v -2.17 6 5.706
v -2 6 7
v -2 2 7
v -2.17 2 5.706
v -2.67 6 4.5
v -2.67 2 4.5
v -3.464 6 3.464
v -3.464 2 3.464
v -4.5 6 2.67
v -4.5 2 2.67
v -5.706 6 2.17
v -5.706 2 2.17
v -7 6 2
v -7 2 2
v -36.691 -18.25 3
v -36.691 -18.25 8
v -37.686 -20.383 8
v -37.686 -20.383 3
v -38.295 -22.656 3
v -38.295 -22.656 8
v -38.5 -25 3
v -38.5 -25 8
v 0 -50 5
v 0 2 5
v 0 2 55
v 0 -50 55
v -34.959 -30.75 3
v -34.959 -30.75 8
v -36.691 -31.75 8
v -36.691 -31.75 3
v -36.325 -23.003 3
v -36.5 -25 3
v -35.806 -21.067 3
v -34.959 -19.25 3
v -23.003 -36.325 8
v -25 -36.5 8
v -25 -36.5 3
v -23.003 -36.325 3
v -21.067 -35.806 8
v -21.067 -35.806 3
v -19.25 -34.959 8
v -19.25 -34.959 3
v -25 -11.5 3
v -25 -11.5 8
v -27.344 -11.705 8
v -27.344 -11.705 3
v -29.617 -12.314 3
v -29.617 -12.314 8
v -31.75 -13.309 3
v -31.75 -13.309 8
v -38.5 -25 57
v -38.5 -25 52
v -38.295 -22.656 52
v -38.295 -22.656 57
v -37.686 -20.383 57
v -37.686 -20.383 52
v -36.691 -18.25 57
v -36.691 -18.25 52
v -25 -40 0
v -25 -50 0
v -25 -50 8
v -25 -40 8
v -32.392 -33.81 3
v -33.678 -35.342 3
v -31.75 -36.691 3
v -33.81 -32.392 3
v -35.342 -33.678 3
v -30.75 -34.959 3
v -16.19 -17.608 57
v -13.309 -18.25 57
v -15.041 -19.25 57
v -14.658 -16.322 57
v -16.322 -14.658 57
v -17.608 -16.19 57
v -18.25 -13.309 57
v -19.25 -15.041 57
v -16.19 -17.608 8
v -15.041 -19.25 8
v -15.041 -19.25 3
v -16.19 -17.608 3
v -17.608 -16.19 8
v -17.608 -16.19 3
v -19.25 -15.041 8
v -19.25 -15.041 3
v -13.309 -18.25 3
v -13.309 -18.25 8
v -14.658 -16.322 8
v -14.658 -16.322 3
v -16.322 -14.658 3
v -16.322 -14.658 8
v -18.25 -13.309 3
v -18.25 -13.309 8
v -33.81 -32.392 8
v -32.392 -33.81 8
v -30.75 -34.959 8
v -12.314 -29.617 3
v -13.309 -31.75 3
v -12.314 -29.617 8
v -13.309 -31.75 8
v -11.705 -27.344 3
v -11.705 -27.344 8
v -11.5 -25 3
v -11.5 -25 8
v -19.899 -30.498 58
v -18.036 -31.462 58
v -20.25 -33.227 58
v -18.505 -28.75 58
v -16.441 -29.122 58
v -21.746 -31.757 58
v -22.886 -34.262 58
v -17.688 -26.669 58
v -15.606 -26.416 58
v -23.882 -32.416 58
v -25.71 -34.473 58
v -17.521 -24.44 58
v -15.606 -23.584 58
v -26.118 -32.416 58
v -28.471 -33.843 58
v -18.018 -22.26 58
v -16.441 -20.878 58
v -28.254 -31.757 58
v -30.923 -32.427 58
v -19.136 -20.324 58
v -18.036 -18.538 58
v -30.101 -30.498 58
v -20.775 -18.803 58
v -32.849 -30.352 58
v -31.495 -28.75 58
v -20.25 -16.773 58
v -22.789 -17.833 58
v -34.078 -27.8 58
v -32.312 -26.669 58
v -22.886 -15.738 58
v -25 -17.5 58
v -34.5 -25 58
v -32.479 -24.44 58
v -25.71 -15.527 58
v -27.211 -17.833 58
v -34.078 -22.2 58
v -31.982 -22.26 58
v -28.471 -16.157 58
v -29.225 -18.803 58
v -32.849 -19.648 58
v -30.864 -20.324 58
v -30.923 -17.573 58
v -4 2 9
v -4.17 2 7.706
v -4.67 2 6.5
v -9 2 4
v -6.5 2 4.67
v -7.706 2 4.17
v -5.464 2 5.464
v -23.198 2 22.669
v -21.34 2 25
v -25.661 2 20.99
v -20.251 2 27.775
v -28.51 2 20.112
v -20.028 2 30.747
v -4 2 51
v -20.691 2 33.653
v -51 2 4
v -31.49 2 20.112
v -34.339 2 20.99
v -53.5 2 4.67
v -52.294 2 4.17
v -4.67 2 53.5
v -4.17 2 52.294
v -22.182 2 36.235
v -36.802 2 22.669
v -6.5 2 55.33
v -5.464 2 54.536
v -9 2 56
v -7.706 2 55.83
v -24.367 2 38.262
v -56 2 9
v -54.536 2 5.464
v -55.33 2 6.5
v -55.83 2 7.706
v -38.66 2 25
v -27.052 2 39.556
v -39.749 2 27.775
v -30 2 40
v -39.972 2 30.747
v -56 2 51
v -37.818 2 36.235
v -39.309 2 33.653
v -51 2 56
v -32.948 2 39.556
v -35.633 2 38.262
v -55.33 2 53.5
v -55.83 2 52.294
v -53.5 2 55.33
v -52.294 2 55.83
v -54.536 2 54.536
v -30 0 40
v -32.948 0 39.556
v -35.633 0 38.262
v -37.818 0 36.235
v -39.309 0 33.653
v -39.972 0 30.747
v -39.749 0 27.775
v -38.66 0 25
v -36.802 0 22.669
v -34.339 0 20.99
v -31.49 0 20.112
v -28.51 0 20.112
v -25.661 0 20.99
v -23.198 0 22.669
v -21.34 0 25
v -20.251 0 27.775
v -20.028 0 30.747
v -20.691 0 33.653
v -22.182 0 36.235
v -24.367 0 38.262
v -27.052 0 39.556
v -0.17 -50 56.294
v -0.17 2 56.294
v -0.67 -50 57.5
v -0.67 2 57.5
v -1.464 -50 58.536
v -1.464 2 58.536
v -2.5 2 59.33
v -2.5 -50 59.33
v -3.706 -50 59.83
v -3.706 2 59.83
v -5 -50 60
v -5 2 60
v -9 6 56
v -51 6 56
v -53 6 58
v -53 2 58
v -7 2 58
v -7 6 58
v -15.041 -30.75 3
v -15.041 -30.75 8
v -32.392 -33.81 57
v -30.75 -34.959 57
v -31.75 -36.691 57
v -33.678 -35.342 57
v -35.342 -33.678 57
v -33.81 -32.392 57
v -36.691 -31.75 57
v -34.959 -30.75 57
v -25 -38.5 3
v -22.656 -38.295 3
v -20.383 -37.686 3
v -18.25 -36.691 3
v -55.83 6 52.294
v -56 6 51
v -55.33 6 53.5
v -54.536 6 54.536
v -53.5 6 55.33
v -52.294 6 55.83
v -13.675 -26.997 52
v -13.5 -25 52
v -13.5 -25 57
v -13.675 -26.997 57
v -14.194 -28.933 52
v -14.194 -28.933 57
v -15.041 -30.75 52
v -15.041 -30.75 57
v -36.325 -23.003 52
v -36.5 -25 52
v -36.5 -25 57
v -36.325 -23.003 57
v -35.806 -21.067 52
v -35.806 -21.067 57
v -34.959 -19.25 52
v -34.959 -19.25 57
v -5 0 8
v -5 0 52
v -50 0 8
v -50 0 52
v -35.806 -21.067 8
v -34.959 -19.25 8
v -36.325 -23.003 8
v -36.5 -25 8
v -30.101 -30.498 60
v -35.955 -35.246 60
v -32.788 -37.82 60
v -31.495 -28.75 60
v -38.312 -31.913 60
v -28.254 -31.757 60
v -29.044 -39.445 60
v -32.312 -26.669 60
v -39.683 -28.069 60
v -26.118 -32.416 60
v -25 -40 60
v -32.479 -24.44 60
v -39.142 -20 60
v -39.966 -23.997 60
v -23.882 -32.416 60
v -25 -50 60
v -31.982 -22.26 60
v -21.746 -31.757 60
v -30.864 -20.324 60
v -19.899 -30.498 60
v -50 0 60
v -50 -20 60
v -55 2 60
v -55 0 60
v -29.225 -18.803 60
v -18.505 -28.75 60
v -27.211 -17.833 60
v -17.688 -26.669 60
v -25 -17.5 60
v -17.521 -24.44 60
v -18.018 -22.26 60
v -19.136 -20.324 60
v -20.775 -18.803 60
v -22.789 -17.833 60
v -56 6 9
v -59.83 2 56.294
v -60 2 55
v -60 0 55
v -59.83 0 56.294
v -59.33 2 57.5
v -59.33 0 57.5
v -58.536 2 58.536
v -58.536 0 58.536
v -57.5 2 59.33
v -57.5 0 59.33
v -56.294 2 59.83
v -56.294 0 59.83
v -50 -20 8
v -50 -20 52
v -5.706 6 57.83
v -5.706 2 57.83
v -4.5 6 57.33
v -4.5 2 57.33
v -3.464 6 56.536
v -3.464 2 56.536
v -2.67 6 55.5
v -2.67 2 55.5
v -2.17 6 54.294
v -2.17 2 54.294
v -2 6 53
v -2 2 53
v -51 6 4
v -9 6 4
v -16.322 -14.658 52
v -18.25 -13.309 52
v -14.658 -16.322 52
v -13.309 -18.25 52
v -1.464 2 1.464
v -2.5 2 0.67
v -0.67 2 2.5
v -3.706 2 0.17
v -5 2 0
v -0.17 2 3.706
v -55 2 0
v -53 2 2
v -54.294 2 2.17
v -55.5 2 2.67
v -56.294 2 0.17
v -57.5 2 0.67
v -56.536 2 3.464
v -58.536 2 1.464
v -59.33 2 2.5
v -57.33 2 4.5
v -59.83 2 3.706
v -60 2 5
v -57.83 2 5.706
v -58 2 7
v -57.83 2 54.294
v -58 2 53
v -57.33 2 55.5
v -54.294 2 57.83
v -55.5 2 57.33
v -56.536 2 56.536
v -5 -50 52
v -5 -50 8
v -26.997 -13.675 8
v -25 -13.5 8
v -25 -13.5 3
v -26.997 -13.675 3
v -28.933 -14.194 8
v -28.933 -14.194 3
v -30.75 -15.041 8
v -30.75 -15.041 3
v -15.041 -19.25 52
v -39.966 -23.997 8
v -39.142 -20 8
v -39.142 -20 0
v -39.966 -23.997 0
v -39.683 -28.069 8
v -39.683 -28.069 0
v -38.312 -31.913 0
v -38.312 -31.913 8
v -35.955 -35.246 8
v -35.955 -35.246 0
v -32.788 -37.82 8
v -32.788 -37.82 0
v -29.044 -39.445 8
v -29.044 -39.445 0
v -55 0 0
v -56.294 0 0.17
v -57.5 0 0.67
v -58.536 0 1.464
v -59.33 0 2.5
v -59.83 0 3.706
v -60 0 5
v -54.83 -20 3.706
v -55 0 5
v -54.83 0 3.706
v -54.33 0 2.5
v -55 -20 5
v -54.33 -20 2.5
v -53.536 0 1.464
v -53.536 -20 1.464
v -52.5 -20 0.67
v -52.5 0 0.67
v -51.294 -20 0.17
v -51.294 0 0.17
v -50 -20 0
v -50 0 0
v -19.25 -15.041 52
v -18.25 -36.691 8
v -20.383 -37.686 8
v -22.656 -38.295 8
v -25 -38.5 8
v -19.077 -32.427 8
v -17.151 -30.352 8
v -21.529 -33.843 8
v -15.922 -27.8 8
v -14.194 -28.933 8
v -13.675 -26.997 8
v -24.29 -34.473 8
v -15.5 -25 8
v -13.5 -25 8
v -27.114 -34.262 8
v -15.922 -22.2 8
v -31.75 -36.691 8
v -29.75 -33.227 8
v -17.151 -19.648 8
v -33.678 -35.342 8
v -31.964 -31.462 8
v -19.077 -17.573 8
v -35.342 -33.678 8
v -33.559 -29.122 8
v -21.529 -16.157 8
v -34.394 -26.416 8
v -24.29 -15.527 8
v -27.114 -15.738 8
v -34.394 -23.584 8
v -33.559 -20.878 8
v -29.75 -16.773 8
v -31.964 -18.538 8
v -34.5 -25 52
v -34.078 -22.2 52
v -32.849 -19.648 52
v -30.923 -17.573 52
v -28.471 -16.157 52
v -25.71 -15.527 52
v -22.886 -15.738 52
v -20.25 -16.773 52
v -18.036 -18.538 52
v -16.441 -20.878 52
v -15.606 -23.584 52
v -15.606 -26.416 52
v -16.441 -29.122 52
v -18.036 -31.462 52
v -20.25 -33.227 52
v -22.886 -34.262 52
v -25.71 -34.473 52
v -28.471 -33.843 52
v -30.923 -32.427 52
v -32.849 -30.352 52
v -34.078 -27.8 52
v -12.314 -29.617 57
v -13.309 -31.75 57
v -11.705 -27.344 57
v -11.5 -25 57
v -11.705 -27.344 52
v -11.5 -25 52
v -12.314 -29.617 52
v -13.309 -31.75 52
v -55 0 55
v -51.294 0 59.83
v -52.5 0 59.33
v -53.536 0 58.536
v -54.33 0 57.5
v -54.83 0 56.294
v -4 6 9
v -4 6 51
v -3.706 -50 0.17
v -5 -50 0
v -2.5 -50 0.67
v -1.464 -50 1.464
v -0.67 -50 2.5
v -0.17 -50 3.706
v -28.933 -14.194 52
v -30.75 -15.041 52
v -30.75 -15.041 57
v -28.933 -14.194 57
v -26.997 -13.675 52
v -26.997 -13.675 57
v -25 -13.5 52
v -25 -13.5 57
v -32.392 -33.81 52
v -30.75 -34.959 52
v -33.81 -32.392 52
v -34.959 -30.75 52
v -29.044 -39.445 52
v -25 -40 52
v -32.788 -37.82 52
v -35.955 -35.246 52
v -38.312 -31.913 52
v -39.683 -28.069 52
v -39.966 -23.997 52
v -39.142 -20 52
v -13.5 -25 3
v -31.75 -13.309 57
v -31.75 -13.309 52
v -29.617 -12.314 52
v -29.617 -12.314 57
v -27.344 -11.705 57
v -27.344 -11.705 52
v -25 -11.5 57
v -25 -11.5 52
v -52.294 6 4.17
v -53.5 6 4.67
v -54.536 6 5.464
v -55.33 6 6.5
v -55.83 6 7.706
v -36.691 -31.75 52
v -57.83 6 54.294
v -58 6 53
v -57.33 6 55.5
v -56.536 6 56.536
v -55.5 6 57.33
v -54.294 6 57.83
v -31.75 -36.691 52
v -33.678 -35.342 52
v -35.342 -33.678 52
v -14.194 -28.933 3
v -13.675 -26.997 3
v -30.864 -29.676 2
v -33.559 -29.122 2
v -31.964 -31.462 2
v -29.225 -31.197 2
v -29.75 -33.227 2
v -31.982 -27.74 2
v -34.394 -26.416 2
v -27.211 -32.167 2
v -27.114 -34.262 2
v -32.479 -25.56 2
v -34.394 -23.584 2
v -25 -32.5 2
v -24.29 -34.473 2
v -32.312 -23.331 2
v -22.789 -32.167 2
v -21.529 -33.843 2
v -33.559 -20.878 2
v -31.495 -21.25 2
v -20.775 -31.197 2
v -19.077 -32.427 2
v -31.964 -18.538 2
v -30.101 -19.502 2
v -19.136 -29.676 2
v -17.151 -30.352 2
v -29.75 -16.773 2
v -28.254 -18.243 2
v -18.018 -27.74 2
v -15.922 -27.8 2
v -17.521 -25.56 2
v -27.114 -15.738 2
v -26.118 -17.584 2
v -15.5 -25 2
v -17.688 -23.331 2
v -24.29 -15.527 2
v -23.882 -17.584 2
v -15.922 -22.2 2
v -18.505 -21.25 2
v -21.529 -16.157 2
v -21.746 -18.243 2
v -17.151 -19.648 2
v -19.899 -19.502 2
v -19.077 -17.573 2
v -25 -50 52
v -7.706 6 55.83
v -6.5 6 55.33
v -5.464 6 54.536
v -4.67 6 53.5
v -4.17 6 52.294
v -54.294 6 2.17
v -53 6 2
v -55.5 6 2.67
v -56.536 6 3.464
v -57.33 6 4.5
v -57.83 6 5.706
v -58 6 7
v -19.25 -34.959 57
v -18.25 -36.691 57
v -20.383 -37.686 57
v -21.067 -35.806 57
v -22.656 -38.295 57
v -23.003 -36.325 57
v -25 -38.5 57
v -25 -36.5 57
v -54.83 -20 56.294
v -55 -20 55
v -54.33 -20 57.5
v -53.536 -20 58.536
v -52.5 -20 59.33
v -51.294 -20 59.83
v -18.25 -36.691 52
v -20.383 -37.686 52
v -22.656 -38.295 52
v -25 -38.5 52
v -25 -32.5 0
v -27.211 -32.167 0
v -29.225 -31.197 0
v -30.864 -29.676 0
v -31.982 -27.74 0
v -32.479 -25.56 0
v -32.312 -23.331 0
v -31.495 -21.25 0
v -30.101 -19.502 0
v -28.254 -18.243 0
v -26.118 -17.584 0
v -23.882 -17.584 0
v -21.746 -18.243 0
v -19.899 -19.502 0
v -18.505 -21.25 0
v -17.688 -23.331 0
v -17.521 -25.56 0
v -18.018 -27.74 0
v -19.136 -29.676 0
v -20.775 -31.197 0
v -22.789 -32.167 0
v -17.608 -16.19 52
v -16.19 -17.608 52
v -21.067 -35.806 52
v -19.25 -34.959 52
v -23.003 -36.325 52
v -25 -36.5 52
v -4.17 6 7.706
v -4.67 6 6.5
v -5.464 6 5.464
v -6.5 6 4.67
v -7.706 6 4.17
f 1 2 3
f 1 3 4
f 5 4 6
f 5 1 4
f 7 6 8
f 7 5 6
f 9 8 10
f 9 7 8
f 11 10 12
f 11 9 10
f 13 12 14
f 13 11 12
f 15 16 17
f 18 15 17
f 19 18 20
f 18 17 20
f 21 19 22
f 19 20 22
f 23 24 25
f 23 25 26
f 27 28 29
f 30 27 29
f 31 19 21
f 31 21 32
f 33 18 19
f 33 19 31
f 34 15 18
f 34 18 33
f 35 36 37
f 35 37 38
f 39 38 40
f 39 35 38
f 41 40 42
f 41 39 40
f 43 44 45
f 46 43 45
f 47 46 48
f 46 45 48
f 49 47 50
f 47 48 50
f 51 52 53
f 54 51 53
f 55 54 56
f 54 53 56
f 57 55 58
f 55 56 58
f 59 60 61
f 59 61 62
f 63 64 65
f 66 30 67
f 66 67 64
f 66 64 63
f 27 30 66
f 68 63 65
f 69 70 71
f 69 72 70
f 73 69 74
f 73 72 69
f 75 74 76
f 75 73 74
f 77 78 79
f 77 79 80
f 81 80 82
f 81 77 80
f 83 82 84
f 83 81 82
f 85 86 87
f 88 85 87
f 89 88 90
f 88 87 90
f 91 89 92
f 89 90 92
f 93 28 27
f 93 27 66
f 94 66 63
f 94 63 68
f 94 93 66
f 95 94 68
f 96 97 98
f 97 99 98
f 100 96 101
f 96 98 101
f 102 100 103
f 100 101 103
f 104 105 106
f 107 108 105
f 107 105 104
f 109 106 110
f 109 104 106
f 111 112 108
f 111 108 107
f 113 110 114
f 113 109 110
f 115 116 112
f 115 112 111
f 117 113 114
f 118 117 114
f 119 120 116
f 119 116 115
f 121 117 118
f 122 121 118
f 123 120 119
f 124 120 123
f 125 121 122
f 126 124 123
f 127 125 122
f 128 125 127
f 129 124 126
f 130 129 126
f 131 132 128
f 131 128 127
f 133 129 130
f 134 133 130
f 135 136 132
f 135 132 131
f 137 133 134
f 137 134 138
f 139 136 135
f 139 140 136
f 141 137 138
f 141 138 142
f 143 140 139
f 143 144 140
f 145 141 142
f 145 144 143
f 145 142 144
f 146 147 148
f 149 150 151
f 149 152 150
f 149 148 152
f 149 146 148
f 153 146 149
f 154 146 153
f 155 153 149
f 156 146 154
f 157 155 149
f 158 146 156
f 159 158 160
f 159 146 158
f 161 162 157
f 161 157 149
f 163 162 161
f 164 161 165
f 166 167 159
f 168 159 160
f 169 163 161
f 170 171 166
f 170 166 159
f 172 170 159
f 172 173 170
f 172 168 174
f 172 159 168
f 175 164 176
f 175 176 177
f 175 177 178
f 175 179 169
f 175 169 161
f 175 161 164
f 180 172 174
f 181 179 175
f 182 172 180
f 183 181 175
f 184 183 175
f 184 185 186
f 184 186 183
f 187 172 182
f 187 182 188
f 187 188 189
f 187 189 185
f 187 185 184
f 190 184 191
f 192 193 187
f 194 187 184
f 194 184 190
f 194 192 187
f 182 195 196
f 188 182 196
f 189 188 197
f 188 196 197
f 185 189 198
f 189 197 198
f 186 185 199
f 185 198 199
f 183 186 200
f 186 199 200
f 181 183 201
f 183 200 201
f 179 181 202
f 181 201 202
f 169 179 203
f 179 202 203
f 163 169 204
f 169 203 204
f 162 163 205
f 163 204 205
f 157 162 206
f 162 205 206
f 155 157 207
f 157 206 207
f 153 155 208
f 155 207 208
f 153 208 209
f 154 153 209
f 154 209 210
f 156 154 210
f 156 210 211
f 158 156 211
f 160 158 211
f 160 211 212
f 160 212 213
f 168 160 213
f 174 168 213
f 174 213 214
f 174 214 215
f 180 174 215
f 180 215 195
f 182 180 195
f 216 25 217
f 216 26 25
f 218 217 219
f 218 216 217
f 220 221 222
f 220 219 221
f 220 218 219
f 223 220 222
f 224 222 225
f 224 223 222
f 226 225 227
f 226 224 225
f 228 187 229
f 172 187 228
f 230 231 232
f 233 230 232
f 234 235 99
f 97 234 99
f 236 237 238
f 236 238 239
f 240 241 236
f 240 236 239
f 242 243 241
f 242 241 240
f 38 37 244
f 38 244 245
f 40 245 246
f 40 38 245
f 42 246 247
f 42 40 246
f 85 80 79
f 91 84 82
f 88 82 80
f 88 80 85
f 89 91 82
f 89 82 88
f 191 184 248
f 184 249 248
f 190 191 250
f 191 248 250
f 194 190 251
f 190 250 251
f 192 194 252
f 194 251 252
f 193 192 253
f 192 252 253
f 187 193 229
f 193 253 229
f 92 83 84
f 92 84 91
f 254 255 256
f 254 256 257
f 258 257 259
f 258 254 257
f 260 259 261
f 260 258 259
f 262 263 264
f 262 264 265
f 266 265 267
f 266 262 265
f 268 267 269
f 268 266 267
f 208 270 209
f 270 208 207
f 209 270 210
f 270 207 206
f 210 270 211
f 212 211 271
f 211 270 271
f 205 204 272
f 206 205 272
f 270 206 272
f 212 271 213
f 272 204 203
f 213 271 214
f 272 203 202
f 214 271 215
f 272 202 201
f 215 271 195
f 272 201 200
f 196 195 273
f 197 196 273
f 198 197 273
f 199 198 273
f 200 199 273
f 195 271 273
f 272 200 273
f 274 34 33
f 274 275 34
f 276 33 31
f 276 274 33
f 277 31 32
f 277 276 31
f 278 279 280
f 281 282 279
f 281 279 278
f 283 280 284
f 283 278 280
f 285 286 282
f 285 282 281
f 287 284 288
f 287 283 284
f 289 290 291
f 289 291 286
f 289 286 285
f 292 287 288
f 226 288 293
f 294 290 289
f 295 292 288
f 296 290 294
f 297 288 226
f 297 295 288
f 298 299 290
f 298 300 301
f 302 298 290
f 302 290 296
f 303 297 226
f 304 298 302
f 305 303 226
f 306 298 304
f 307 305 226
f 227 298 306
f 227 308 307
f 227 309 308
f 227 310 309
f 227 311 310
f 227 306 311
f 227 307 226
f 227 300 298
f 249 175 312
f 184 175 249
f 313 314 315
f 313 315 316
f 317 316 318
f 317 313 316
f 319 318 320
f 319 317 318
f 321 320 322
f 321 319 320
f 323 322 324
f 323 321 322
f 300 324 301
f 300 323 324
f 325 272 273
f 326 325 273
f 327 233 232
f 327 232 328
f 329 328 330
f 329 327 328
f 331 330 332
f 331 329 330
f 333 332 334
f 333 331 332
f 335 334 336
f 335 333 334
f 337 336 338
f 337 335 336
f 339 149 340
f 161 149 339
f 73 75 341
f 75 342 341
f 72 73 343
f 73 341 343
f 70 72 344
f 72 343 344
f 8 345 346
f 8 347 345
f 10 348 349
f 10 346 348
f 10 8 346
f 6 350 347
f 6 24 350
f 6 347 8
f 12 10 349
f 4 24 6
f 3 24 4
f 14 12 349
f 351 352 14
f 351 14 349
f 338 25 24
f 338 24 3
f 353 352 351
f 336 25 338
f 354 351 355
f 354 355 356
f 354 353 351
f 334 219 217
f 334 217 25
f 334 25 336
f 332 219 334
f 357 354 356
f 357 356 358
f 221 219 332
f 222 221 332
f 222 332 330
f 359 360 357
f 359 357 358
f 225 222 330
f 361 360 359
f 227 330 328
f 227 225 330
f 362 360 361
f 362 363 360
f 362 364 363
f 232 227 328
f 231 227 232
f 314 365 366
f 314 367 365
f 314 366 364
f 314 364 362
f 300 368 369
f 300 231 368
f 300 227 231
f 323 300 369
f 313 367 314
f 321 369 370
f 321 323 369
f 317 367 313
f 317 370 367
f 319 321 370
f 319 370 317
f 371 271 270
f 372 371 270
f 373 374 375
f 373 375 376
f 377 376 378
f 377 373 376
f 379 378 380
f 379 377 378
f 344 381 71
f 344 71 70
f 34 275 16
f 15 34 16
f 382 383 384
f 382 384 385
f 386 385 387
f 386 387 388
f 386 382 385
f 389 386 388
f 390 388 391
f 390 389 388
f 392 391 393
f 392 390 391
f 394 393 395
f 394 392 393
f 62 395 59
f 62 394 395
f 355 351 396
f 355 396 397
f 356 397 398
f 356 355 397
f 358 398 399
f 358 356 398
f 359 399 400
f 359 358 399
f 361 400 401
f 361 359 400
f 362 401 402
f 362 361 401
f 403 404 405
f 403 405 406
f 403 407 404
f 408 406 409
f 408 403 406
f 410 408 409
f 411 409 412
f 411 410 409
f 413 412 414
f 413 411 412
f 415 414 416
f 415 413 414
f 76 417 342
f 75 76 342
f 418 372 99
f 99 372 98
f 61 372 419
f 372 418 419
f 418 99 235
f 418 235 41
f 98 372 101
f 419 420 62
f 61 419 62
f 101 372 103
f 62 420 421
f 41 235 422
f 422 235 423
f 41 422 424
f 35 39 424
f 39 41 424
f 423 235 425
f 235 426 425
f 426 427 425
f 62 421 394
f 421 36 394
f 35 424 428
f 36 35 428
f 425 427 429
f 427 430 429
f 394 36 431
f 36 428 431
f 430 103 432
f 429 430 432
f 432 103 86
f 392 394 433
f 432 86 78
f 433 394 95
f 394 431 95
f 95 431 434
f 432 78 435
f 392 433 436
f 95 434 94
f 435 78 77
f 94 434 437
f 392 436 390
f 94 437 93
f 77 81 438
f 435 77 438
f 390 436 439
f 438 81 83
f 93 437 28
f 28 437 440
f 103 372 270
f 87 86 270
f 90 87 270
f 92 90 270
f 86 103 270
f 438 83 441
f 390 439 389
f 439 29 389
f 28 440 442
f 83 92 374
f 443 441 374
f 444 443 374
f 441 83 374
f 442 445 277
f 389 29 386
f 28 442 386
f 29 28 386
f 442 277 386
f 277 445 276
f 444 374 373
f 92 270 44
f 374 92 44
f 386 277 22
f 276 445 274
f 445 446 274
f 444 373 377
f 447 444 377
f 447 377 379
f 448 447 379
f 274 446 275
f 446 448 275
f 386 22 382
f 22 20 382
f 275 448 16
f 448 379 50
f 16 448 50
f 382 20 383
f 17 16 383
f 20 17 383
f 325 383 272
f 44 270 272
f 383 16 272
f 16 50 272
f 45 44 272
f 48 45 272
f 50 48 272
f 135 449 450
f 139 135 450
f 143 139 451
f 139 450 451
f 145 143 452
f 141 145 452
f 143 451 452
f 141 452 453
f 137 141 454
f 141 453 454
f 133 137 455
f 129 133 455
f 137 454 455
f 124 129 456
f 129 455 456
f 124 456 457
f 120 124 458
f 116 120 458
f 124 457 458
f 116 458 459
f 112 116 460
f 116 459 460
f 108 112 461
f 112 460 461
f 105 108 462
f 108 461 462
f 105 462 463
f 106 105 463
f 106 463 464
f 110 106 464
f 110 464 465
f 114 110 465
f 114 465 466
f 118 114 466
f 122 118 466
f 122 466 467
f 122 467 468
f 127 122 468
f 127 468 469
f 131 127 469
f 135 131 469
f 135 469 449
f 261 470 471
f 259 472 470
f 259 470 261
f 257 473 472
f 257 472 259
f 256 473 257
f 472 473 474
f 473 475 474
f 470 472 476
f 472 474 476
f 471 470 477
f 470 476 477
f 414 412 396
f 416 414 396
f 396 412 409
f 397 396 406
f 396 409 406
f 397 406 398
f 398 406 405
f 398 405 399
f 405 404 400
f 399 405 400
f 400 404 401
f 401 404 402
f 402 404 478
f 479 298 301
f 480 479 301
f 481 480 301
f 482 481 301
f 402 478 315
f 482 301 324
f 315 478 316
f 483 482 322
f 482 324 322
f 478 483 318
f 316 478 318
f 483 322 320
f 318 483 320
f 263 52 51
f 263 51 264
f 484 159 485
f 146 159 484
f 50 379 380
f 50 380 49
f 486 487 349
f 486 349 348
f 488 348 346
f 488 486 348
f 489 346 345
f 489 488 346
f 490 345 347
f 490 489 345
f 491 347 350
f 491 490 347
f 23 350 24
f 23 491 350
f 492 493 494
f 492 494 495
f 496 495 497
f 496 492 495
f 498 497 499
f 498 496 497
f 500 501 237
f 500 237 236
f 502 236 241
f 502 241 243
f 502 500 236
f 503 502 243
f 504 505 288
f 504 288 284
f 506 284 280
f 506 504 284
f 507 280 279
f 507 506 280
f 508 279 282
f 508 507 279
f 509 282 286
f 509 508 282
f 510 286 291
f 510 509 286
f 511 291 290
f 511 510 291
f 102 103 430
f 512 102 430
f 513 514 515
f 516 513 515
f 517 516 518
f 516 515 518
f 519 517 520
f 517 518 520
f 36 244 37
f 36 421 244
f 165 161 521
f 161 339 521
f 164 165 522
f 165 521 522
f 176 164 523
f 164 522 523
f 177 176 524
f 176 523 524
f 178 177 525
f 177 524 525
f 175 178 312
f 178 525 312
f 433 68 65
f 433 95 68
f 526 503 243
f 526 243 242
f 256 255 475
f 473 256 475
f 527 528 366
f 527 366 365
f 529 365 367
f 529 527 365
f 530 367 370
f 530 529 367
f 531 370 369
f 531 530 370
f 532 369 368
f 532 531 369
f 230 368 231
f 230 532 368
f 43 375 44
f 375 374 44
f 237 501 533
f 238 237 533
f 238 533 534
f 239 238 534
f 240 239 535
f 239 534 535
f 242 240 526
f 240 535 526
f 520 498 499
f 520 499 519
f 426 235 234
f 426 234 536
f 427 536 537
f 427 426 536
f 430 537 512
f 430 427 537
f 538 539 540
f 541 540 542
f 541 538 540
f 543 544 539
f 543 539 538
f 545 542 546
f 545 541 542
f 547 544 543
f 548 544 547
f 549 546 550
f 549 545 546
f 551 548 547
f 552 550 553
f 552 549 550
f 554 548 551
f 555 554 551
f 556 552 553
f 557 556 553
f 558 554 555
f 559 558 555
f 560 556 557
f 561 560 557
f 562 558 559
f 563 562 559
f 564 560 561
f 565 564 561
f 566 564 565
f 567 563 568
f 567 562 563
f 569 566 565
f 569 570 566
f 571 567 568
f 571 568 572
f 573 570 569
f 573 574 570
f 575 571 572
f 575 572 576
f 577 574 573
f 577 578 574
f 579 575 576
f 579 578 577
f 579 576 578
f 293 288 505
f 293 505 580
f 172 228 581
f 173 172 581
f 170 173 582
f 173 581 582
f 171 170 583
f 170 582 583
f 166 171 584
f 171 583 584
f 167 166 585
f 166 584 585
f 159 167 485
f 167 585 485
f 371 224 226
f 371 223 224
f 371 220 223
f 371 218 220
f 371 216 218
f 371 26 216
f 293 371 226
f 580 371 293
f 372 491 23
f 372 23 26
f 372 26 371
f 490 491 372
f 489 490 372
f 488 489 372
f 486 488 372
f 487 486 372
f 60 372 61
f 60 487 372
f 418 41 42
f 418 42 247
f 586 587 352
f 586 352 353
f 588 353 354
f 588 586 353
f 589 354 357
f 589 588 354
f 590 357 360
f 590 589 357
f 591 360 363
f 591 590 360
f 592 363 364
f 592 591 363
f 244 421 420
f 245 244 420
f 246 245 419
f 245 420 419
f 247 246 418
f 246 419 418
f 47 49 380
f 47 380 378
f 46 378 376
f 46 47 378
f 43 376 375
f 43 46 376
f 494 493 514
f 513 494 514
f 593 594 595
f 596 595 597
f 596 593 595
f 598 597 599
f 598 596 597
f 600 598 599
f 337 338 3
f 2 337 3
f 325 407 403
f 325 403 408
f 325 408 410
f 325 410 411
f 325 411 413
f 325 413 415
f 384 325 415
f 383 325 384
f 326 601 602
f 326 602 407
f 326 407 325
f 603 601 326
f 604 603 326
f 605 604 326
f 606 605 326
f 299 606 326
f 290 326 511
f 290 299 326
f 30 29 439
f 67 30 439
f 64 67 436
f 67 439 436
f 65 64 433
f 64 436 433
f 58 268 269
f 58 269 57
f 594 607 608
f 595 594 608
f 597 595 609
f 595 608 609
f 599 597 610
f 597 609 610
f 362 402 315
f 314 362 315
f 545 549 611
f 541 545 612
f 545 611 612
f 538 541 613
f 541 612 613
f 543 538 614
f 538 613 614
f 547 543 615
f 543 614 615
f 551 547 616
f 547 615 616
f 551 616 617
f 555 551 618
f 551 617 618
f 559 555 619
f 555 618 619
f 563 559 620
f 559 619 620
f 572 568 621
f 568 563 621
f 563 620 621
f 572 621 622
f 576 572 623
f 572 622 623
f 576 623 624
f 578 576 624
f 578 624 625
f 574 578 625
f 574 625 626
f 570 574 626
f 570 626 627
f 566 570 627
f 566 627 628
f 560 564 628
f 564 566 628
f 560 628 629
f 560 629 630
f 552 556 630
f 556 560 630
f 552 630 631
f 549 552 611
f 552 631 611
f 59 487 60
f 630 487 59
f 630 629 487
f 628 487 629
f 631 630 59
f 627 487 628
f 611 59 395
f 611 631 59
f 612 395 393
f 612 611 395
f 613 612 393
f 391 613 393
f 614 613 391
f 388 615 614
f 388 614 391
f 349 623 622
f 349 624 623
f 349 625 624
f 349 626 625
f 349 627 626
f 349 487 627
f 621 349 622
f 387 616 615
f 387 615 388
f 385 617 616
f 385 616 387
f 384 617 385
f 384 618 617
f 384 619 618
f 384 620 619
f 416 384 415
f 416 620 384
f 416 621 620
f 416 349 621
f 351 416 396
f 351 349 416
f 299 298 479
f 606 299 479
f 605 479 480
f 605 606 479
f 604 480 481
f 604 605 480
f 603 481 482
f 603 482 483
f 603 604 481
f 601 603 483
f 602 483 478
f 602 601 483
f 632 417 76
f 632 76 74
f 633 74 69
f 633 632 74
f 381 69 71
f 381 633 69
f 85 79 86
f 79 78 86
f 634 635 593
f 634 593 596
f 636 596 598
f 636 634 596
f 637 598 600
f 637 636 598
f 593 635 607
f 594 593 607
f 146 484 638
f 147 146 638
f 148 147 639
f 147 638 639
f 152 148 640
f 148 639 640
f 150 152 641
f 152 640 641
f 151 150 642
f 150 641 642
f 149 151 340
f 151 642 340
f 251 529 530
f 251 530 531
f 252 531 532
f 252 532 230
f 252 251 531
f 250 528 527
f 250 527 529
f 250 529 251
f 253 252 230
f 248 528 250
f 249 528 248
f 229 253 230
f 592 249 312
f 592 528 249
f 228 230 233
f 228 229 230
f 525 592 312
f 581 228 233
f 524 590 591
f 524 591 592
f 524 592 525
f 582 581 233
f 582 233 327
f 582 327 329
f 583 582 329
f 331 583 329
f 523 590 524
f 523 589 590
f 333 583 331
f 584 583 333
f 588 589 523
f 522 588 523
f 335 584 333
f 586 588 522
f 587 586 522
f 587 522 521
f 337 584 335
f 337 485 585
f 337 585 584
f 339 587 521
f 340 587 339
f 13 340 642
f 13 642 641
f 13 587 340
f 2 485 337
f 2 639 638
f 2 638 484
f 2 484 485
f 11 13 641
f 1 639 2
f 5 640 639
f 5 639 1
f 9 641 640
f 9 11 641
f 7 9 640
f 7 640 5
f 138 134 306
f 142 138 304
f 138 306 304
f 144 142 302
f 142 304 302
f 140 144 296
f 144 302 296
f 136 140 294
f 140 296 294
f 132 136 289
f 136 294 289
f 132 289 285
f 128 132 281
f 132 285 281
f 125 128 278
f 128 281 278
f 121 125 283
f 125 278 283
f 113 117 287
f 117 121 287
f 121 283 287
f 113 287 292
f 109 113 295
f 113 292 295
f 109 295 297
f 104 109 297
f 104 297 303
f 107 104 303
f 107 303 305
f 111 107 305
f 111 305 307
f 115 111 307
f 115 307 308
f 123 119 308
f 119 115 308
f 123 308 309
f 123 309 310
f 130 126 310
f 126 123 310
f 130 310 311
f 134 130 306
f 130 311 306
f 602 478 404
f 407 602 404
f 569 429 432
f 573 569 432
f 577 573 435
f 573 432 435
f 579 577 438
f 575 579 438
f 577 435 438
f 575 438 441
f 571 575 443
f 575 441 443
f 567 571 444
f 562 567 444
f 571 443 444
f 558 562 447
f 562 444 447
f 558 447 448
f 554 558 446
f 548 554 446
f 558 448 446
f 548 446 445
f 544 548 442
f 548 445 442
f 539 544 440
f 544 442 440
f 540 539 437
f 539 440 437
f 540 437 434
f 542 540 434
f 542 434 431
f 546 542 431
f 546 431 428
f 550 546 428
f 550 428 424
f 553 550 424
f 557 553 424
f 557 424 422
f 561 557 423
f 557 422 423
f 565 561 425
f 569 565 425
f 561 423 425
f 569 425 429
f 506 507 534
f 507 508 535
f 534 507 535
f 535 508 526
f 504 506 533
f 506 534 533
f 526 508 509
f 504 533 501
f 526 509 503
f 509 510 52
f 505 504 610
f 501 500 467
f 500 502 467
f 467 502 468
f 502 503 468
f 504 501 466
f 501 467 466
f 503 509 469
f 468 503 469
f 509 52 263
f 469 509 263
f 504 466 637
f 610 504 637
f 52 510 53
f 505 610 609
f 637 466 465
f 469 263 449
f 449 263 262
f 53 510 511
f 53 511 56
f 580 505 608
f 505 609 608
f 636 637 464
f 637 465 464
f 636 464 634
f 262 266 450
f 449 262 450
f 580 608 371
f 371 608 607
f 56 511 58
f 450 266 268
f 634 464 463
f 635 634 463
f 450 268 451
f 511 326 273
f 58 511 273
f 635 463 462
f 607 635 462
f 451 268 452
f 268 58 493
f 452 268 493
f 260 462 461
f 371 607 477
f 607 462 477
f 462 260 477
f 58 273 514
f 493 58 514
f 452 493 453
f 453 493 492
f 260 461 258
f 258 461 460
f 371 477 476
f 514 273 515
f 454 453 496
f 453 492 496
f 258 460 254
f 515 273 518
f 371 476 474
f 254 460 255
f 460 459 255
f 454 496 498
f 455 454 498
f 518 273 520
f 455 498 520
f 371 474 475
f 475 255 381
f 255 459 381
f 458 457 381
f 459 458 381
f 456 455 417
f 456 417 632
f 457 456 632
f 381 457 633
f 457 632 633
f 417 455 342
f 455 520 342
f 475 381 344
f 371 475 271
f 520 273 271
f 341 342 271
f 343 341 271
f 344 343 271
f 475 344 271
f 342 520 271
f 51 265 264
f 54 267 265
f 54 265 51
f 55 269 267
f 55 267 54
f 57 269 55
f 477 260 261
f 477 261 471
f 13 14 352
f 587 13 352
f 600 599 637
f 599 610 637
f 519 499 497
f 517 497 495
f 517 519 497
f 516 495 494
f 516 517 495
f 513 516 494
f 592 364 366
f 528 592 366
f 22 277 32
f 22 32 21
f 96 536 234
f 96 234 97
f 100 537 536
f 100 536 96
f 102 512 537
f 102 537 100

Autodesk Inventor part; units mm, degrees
ref_plane "YZ Plane" through (0, 0, 0) normal (1, 0, 0) x (0, 1, 0)
ref_plane "XZ Plane" through (0, 0, 0) normal (0, 1, 0) x (-1, 0, 0)
ref_plane "XY Plane" through (0, 0, 0) normal (0, 0, 1) x (1, 0, 0)
sketch "Sketch1" plane through (0, 0, 0) normal (0, 1, 0) x (-1, 0, 0)
  line L0 (0, 0) -> (60, 0)
  line L1 (60, 0) -> (60, 60)
  line L2 (60, 60) -> (0, 60)
  line L3 (0, 60) -> (0, 0)
  dimension "d0" = 60
  dimension "d1" = 60
extrude "Extrusion1" add sketch "Sketch1" along normal blind 2
sketch "Sketch2" plane through (0, 2, 0) normal (0, 1, 0) x (1, 0, 0)
  line L0 (-60, 0) -> (-60, -60) projected
  line L1 (-60, -60) -> (0, -60) projected
  line L2 (0, -60) -> (0, 0) projected
  line L3 (0, 0) -> (-60, 0) projected
  line L4 (-58, -2) -> (-58, -58)
  line L5 (-58, -58) -> (-2, -58)
  line L6 (-2, -58) -> (-2, -2)
  line L7 (-2, -2) -> (-58, -2)
  line L8 (-56, -4) -> (-56, -56)
  line L9 (-56, -56) -> (-4, -56)
  line L10 (-4, -56) -> (-4, -4)
  line L11 (-4, -4) -> (-56, -4)
  dimension "d4" = 2
  dimension "d5" = 2
extrude "Extrusion2" add sketch "Sketch2" along normal blind 4 contours L7 L6 L5 L4
sketch "Sketch3" plane through (0, 2, 0) normal (0, 1, 0) x (1, 0, 0)
  line L0 (0, 0) -> (-60, 0) construction
  line L1 (-60, 0) -> (-60, -60) construction
  line L2 (0, 0) -> (-60, -60) construction
  line L3 (-60, -60) -> (0, -60) construction
  line L4 (0, -60) -> (-60, 0) construction
  circle A0 centre (-30, -30) radius 10
  dimension "d8" = 20
hole "Hole1" at (-30, 2, 30) direction (0, -1, 0) diameter 20 depth 8 tip angle 118
sketch "Sketch4" plane through (0, 0, 0) normal (0, -1, 0) x (1, 0, 0)
  circle A0 centre (-30, 30) radius 10 projected
  line L0 (-60, 0) -> (-60, 60) projected
  line L1 (0, 0) -> (-60, 0) projected
  line L2 (0, 60) -> (0, 0) projected
  line L3 (-60, 60) -> (0, 60) projected
  line L4 (0, 0) -> (-50, 0)
  line L5 (-50, 0) -> (-50, 8)
  line L6 (-50, 8) -> (0, 8)
  line L7 (0, 8) -> (0, 0)
  line L8 (0, 60) -> (-50, 60)
  line L9 (-50, 60) -> (-50, 52)
  line L10 (-50, 52) -> (0, 52)
  line L11 (0, 52) -> (0, 60)
  line L12 (0, 8) -> (-5, 8)
  line L13 (-5, 8) -> (-5, 52)
  line L14 (-5, 52) -> (0, 52)
  line L15 (0, 52) -> (0, 8)
  dimension "d16" = 50
  dimension "d17" = 8
  dimension "d18" = 50
  dimension "d19" = 8
  dimension "d20" = 5
extrude "Extrusion3" add sketch "Sketch4" along normal blind 10 contours L5 L6 L2 L1 | L3 L2 L10 L9 | L6 L13 L10 L2
sketch "Sketch5" plane through (-5, 0, 52) normal (0, 0, -1) x (-1, 0, 0)
  line L0 (55, 0) -> (45, 0) projected
  line L1 (45, 0) -> (45, -10) projected
  line L2 (-5, -10) -> (45, -10) projected
  line L3 (-5, -10) -> (-5, 2) projected
  line L4 (55, 2) -> (-5, 2) projected
  line L5 (55, 0) -> (55, 2) projected
  line L6 (-5, -10) -> (45, -10) construction
  line L7 (-5, -10) -> (5, -10) construction
  line L8 (5, -10) -> (20, -10) construction
  line L9 (20, -10) -> (20, -25) construction
  circle A0 centre (20, -25) radius 15
  point P0 (-5, 0)
  dimension "d23" = 10
  dimension "d24" = 15
  dimension "d25" = 15
  dimension "d26" = 30
extrude "Extrusion4" add sketch "Sketch5" against normal blind 8 contours A0
sketch "Sketch6" plane through (-50, 0, 8) normal (0, 0, 1) x (1, 0, 0)
  line L0 (0, 0) -> (-10, 0) projected
  line L1 (-10, 0) -> (-10, 2) projected
  line L2 (50, 2) -> (-10, 2) projected
  line L3 (50, -10) -> (50, 2) projected
  line L4 (0, -10) -> (50, -10) projected
  line L5 (0, 0) -> (0, -10) projected
  line L6 (0, -10) -> (50, -10) construction
  line L7 (50, -10) -> (40, -10) construction
  line L8 (40, -10) -> (25, -10) construction
  line L9 (25, -10) -> (25, -25) construction
  circle A0 centre (25, -25) radius 15
  point P0 (50, 0)
  dimension "d29" = 10
  dimension "d30" = 15
  dimension "d31" = 15
  dimension "d32" = 30
extrude "Extrusion5" add sketch "Sketch6" against normal blind 8 contours A0
sketch "Sketch7" plane through (-25, -25, 52) normal (0, 0, -1) x (-1, 0, 0)
  circle A0 centre (0, 0) radius 15 projected
  circle A1 centre (0, 0) radius 13.5
  circle A2 centre (0, 0) radius 11.5
  circle A3 centre (0, 0) radius 15
  circle A4 centre (0, 0) radius 15 projected
  line L0 (0, -15) -> (0, 15)
  line L1 (15, 0) -> (-15, 0)
  line L2 (0, 0) -> (-12.9904, -7.5)
  line L3 (0, 0) -> (15, 0) construction
  line L4 (-12.9904, -7.5) -> (12.9904, 7.5)
  line L5 (0, 0) -> (-7.5, -12.9904)
  line L6 (0, 0) -> (15, 0) construction
  line L7 (-7.5, -12.9904) -> (7.5, 12.9904)
  line L8 (0, 0) -> (7.5, -12.9904)
  line L9 (0, 0) -> (15, 0) construction
  line L10 (7.5, -12.9904) -> (-7.5, 12.9904)
  line L11 (0, 0) -> (12.9904, -7.5)
  line L12 (0, 0) -> (15, 0) construction
  line L13 (12.9904, -7.5) -> (-12.9904, 7.5)
  point P0 (-25, 25)
  point P1 (11.6913, 6.75)
  point P2 (9.9593, 5.75)
  point P3 (11.5, 0)
  point P4 (13.5, 0)
  point P5 (5.75, 9.9593)
  point P6 (6.75, 11.6913)
  point P7 (0, 13.5)
  point P8 (0, 11.5)
  point P9 (-11.6913, 6.75)
  point P10 (-9.9593, 5.75)
  point P11 (-5.75, 9.9593)
  point P12 (-6.75, 11.6913)
  point P13 (-11.6913, -6.75)
  point P14 (-9.9593, -5.75)
  point P15 (-11.5, 0)
  point P16 (-13.5, 0)
  point P17 (-5.75, -9.9593)
  point P18 (-6.75, -11.6913)
  point P19 (0, -13.5)
  point P20 (0, -11.5)
  point P21 (11.6913, -6.75)
  point P22 (9.9593, -5.75)
  point P23 (5.75, -9.9593)
  point P24 (6.75, -11.6913)
  dimension "d35" = 1.5
  dimension "d36" = 2
  dimension "d37" = 30
  dimension "d38" = 150
  dimension "d39" = 120
  dimension "d40" = 60
  dimension "d41" = 30
extrude "Extrusion6" cut sketch "Sketch7" against normal blind 5 contours L1 A2 L4 A1 | A1 L8 A2 L11 | L7 A2 L0 A1 | A1 L5 A2 L0 | A2 L2 A1 L1 | A2 L13 A1 L10
sketch "Sketch8" plane through (-25, -25, 8) normal (0, 0, 1) x (1, 0, 0)
  circle A0 centre (0, 0) radius 15
  circle A1 centre (0, 0) radius 13.5
  circle A2 centre (0, 0) radius 11.5
  circle A3 centre (0, 0) radius 15
  circle A4 centre (0, 0) radius 15
  line L0 (0, -15) -> (0, 15)
  line L1 (15, 0) -> (-15, 0)
  line L2 (0, 0) -> (-12.9904, -7.5)
  line L3 (0, 0) -> (15, 0) construction
  line L4 (-12.9904, -7.5) -> (12.9904, 7.5)
  line L5 (0, 0) -> (-7.5, -12.9904)
  line L6 (0, 0) -> (15, 0) construction
  line L7 (-7.5, -12.9904) -> (7.5, 12.9904)
  line L8 (0, 0) -> (7.5, -12.9904)
  line L9 (0, 0) -> (15, 0) construction
  line L10 (7.5, -12.9904) -> (-7.5, 12.9904)
  line L11 (0, 0) -> (12.9904, -7.5)
  line L12 (0, 0) -> (15, 0) construction
  line L13 (12.9904, -7.5) -> (-12.9904, 7.5)
  point P0 (25, 25)
  point P1 (-25, 25)
  point P2 (11.6913, 6.75)
  point P3 (9.9593, 5.75)
  point P4 (11.5, 0)
  point P5 (13.5, 0)
  point P6 (5.75, 9.9593)
  point P7 (6.75, 11.6913)
  point P8 (0, 13.5)
  point P9 (0, 11.5)
  point P10 (-11.6913, 6.75)
  point P11 (-9.9593, 5.75)
  point P12 (-5.75, 9.9593)
  point P13 (-6.75, 11.6913)
  point P14 (-11.6913, -6.75)
  point P15 (-9.9593, -5.75)
  point P16 (-11.5, 0)
  point P17 (-13.5, 0)
  point P18 (-5.75, -9.9593)
  point P19 (-6.75, -11.6913)
  point P20 (0, -13.5)
  point P21 (0, -11.5)
  point P22 (11.6913, -6.75)
  point P23 (9.9593, -5.75)
  point P24 (5.75, -9.9593)
  point P25 (6.75, -11.6913)
  point P26 (9.9593, -5.75)
  point P27 (11.6913, -6.75)
  point P28 (13.5, 0)
  point P29 (11.5, 0)
  point P30 (6.75, 11.6913)
  point P31 (5.75, 9.9593)
  point P32 (9.9593, 5.75)
  point P33 (11.6913, 6.75)
  point P34 (-6.75, 11.6913)
  point P35 (-5.75, 9.9593)
  point P36 (0, 11.5)
  point P37 (0, 13.5)
  point P38 (-9.9593, 5.75)
  point P39 (-11.6913, 6.75)
  point P40 (-13.5, 0)
  point P41 (-11.5, 0)
  point P42 (-6.75, -11.6913)
  point P43 (-5.75, -9.9593)
  point P44 (-9.9593, -5.75)
  point P45 (-11.6913, -6.75)
  point P46 (6.75, -11.6913)
  point P47 (5.75, -9.9593)
  point P48 (0, -11.5)
  point P49 (0, -13.5)
  dimension "d44" = 1.5
  dimension "d45" = 2
  dimension "d46" = 30
  dimension "d47" = 150
  dimension "d48" = 120
  dimension "d49" = 60
  dimension "d50" = 30
extrude "Extrusion7" cut sketch "Sketch8" against normal blind 5 contours A1 L11 A2 L1 | L4 A2 L7 A1 | A1 L0 A2 L8 | L0 A2 L10 A1 | L1 A1 L13 A2 | A2 L5 A1 L2
sketch "Sketch9" plane through (-25, -25, 52) normal (0, 0, -1) x (-1, 0, 0)
  circle A0 centre (0, 0) radius 15 projected
  circle A1 centre (0, 0) radius 7.5
  point P0 (-25, 25)
  point P1 (0, 15)
  dimension "d53" = 15
hole "Hole2" at (-25, -25, 52) direction (0, 0, 1) diameter 15 depth 8 tip angle 118
sketch "Sketch10" plane through (-25, -25, 8) normal (0, 0, 1) x (1, 0, 0)
  circle A0 centre (0, 0) radius 15 projected
  point P0 (25, 25)
  point P1 (0, 15)
hole "Hole3" at (-25, -25, 8) direction (0, 0, -1) diameter 15 depth 8 tip angle 118
sketch "Sketch11" plane through (-25, -25, 8) normal (0, 0, 1) x (1, 0, 0)
  circle A0 centre (0, 0) radius 7.5 projected
  circle A1 centre (0, 0) radius 15 projected
  circle A2 centre (0, 0) radius 9.5
  point P0 (25, 25)
  point P1 (0, 15)
  dimension "d68" = 2
extrude "Extrusion8" cut sketch "Sketch11" against normal blind 6 contours A2
sketch "Sketch12" plane through (-25, -25, 52) normal (0, 0, -1) x (-1, 0, 0)
  circle A0 centre (0, 0) radius 7.5 projected
  circle A1 centre (0, 0) radius 15 projected
  circle A2 centre (0, 0) radius 9.5
  point P0 (-25, 25)
  point P1 (0, 15)
  dimension "d71" = 2
extrude "Extrusion9" cut sketch "Sketch12" against normal blind 6 contours A2
sketch "Sketch13" plane through (-60, 2, 60) normal (0, 0, 1) x (1, 0, 0)
  point P0 (60, -2)
sketch "Sketch14" plane through (-60, 2, 60) normal (0, 0, 1) x (1, 0, 0)
  line L0 (0, -2) -> (10, -2) projected
  line L1 (10, -2) -> (10, -12) projected
  line L2 (35, -12) -> (10, -12) projected
  line L3 (60, -12) -> (35, -12) projected
  line L4 (60, -12) -> (60, 0) projected
  line L5 (0, 0) -> (60, 0) projected
  line L6 (0, -2) -> (0, 0) projected
  arc A0 (44.9593, -21.25) -> (40.75, -17.0407) centre (35, -27) ccw projected
  circle A1 centre (35, -27) radius 15 projected
  line L7 (60, -12) -> (60, 0) projected
  line L8 (60, -12) -> (35, -12)
  line L9 (35, -42) -> (35, -52)
  line L10 (35, -52) -> (60, -52)
  line L11 (60, -52) -> (60, -12)
  arc A2 (35, -42) -> (35, -12) centre (35, -27) ccw
  point P0 (60, -2)
  dimension "d74" = 25
  dimension "d75" = 40
extrude "Extrusion10" add sketch "Sketch14" against normal blind 8 contours L3 L11 L10 L9 A1
sketch "Sketch15" plane through (0, 2, 0) normal (0, 0, -1) x (-1, 0, 0)
  line L0 (50, -2) -> (60, -2) projected
  line L1 (60, -2) -> (60, 0) projected
  line L2 (0, 0) -> (60, 0) projected
  line L3 (0, -12) -> (0, 0) projected
  line L4 (25, -12) -> (0, -12) projected
  line L5 (50, -12) -> (25, -12) projected
  line L6 (50, -2) -> (50, -12) projected
  circle A0 centre (25, -27) radius 15 projected
  line L7 (0, -52) -> (25, -52) projected
  line L8 (25, -12) -> (0, -12)
  line L9 (0, -12) -> (0, -52)
  line L10 (0, -52) -> (25, -52)
  circle A1 centre (25, -27) radius 7.5 projected
  arc A2 (25, -12) -> (25, -42) centre (25, -27) ccw
  line L11 (25, -52) -> (25, -42)
  point P0 (0, -2)
extrude "Extrusion11" add sketch "Sketch15" against normal blind 8 contours A0 L11 L7 L9 L4
sketch "Sketch16" plane through (0, -10, 0) normal (0, -1, 0) x (1, 0, 0)
  line L0 (-4, 56) -> (-4, 4) projected
  line L1 (0, 8) -> (0, 52) projected
  line L2 (-5, 52) -> (-5, 8) projected
  line L3 (-25, 8) -> (0, 8) projected
  line L4 (0, 52) -> (-25, 52) projected
  line L5 (-5, 8) -> (-5, 52) projected
  line L6 (0, 8) -> (-5, 8)
  line L7 (-5, 8) -> (-5, 52)
  line L8 (-5, 52) -> (0, 52)
  line L9 (0, 52) -> (0, 8)
  point P0 (0, 0)
extrude "Extrusion12" add sketch "Sketch16" along normal blind 40
sketch "Sketch17" plane through (0, 0, 0) normal (0, -1, 0) x (1, 0, 0)
  line L0 (-50, 52) -> (-50, 60) projected
  line L1 (-60, 60) -> (-50, 60) projected
  line L2 (-60, 0) -> (-60, 60) projected
  line L3 (-50, 0) -> (-60, 0) projected
  line L4 (-50, 0) -> (-50, 8) projected
  line L5 (-50, 8) -> (-5, 8) projected
  line L6 (-5, 8) -> (-5, 52) projected
  line L7 (-5, 52) -> (-50, 52) projected
  circle A0 centre (-30, 30) radius 10 projected
  line L8 (-50, 60) -> (-50, 52) projected
  line L9 (-50, 60) -> (-55, 60)
  line L10 (-55, 60) -> (-55, 0)
  line L11 (-55, 0) -> (-50, 0)
  line L12 (-50, 0) -> (-50, 60)
  point P0 (0, 0)
  dimension "d82" = 5
  dimension "d83" = 60
extrude "Extrusion13" add sketch "Sketch17" along normal blind 20 contours L12 L4 L3 L10 L1 L0
sketch "Sketch18" plane through (0, 2, 0) normal (0, 0, -1) x (-1, 0, 0)
  circle A0 centre (25, -27) radius 7.5 projected
  line L0 (55, -2) -> (60, -2) projected
  line L1 (60, -2) -> (60, 0) projected
  line L2 (0, 0) -> (60, 0) projected
  line L3 (0, -52) -> (0, 0) projected
  line L4 (0, -52) -> (25, -52) projected
  line L5 (25, -52) -> (25, -42) projected
  arc A1 (25, -42) -> (25, -12) centre (25, -27) ccw projected
  line L6 (50, -12) -> (25, -12) projected
  line L7 (50, -12) -> (50, -22) projected
  line L8 (55, -22) -> (50, -22) projected
  line L9 (55, -2) -> (55, -22) projected
  line L10 (50, -12) -> (50, -22) projected
  line L11 (50, -12) -> (25, -12)
  line L12 (50, -22) -> (50, -12)
  arc A2 (39.1421, -22) -> (25, -12) centre (25, -27) ccw
  line L13 (39.1421, -22) -> (50, -22)
  point P0 (0, -2)
extrude "Extrusion14" add sketch "Sketch18" against normal blind 8 contours L13 A1 L6 L7
sketch "Sketch19" plane through (-60, 2, 60) normal (0, 0, 1) x (1, 0, 0)
  circle A0 centre (35, -27) radius 7.5 projected
  arc A1 (35, -12) -> (35, -42) centre (35, -27) ccw projected
  line L0 (35, -42) -> (35, -52) projected
  line L1 (35, -52) -> (60, -52) projected
  line L2 (60, -52) -> (60, 0) projected
  line L3 (0, 0) -> (60, 0) projected
  line L4 (0, -2) -> (0, 0) projected
  line L5 (0, -2) -> (5, -2) projected
  line L6 (5, -2) -> (5, -22) projected
  line L7 (10, -22) -> (5, -22) projected
  line L8 (10, -12) -> (10, -22) projected
  line L9 (35, -12) -> (10, -12) projected
  line L10 (35, -22) -> (35, -19.5)
  line L11 (35, -12) -> (10, -12)
  line L12 (10, -12) -> (10, -22)
  arc A2 (35, -12) -> (20.8579, -22) centre (35, -27) ccw
  line L13 (10, -22) -> (20.8579, -22)
  point P0 (60, -2)
extrude "Extrusion15" add sketch "Sketch19" against normal blind 8 contours A1 L13 L8 L9
fillet "Fillet1" radius 5 14 edges at (0, -24, 0) (-55, -10, 0) (-55, -10, 60) (0, -24, 60) (-2, 4, 58) (-2, 4, 2) (-60, 1, 0) (-58, 4, 2) (-60, 1, 60) (-58, 4, 58) (-56, 4, 56) (-56, 4, 4) (-4, 4, 56) (-4, 4, 4)
properties part number "Pieza 2.3 final"
